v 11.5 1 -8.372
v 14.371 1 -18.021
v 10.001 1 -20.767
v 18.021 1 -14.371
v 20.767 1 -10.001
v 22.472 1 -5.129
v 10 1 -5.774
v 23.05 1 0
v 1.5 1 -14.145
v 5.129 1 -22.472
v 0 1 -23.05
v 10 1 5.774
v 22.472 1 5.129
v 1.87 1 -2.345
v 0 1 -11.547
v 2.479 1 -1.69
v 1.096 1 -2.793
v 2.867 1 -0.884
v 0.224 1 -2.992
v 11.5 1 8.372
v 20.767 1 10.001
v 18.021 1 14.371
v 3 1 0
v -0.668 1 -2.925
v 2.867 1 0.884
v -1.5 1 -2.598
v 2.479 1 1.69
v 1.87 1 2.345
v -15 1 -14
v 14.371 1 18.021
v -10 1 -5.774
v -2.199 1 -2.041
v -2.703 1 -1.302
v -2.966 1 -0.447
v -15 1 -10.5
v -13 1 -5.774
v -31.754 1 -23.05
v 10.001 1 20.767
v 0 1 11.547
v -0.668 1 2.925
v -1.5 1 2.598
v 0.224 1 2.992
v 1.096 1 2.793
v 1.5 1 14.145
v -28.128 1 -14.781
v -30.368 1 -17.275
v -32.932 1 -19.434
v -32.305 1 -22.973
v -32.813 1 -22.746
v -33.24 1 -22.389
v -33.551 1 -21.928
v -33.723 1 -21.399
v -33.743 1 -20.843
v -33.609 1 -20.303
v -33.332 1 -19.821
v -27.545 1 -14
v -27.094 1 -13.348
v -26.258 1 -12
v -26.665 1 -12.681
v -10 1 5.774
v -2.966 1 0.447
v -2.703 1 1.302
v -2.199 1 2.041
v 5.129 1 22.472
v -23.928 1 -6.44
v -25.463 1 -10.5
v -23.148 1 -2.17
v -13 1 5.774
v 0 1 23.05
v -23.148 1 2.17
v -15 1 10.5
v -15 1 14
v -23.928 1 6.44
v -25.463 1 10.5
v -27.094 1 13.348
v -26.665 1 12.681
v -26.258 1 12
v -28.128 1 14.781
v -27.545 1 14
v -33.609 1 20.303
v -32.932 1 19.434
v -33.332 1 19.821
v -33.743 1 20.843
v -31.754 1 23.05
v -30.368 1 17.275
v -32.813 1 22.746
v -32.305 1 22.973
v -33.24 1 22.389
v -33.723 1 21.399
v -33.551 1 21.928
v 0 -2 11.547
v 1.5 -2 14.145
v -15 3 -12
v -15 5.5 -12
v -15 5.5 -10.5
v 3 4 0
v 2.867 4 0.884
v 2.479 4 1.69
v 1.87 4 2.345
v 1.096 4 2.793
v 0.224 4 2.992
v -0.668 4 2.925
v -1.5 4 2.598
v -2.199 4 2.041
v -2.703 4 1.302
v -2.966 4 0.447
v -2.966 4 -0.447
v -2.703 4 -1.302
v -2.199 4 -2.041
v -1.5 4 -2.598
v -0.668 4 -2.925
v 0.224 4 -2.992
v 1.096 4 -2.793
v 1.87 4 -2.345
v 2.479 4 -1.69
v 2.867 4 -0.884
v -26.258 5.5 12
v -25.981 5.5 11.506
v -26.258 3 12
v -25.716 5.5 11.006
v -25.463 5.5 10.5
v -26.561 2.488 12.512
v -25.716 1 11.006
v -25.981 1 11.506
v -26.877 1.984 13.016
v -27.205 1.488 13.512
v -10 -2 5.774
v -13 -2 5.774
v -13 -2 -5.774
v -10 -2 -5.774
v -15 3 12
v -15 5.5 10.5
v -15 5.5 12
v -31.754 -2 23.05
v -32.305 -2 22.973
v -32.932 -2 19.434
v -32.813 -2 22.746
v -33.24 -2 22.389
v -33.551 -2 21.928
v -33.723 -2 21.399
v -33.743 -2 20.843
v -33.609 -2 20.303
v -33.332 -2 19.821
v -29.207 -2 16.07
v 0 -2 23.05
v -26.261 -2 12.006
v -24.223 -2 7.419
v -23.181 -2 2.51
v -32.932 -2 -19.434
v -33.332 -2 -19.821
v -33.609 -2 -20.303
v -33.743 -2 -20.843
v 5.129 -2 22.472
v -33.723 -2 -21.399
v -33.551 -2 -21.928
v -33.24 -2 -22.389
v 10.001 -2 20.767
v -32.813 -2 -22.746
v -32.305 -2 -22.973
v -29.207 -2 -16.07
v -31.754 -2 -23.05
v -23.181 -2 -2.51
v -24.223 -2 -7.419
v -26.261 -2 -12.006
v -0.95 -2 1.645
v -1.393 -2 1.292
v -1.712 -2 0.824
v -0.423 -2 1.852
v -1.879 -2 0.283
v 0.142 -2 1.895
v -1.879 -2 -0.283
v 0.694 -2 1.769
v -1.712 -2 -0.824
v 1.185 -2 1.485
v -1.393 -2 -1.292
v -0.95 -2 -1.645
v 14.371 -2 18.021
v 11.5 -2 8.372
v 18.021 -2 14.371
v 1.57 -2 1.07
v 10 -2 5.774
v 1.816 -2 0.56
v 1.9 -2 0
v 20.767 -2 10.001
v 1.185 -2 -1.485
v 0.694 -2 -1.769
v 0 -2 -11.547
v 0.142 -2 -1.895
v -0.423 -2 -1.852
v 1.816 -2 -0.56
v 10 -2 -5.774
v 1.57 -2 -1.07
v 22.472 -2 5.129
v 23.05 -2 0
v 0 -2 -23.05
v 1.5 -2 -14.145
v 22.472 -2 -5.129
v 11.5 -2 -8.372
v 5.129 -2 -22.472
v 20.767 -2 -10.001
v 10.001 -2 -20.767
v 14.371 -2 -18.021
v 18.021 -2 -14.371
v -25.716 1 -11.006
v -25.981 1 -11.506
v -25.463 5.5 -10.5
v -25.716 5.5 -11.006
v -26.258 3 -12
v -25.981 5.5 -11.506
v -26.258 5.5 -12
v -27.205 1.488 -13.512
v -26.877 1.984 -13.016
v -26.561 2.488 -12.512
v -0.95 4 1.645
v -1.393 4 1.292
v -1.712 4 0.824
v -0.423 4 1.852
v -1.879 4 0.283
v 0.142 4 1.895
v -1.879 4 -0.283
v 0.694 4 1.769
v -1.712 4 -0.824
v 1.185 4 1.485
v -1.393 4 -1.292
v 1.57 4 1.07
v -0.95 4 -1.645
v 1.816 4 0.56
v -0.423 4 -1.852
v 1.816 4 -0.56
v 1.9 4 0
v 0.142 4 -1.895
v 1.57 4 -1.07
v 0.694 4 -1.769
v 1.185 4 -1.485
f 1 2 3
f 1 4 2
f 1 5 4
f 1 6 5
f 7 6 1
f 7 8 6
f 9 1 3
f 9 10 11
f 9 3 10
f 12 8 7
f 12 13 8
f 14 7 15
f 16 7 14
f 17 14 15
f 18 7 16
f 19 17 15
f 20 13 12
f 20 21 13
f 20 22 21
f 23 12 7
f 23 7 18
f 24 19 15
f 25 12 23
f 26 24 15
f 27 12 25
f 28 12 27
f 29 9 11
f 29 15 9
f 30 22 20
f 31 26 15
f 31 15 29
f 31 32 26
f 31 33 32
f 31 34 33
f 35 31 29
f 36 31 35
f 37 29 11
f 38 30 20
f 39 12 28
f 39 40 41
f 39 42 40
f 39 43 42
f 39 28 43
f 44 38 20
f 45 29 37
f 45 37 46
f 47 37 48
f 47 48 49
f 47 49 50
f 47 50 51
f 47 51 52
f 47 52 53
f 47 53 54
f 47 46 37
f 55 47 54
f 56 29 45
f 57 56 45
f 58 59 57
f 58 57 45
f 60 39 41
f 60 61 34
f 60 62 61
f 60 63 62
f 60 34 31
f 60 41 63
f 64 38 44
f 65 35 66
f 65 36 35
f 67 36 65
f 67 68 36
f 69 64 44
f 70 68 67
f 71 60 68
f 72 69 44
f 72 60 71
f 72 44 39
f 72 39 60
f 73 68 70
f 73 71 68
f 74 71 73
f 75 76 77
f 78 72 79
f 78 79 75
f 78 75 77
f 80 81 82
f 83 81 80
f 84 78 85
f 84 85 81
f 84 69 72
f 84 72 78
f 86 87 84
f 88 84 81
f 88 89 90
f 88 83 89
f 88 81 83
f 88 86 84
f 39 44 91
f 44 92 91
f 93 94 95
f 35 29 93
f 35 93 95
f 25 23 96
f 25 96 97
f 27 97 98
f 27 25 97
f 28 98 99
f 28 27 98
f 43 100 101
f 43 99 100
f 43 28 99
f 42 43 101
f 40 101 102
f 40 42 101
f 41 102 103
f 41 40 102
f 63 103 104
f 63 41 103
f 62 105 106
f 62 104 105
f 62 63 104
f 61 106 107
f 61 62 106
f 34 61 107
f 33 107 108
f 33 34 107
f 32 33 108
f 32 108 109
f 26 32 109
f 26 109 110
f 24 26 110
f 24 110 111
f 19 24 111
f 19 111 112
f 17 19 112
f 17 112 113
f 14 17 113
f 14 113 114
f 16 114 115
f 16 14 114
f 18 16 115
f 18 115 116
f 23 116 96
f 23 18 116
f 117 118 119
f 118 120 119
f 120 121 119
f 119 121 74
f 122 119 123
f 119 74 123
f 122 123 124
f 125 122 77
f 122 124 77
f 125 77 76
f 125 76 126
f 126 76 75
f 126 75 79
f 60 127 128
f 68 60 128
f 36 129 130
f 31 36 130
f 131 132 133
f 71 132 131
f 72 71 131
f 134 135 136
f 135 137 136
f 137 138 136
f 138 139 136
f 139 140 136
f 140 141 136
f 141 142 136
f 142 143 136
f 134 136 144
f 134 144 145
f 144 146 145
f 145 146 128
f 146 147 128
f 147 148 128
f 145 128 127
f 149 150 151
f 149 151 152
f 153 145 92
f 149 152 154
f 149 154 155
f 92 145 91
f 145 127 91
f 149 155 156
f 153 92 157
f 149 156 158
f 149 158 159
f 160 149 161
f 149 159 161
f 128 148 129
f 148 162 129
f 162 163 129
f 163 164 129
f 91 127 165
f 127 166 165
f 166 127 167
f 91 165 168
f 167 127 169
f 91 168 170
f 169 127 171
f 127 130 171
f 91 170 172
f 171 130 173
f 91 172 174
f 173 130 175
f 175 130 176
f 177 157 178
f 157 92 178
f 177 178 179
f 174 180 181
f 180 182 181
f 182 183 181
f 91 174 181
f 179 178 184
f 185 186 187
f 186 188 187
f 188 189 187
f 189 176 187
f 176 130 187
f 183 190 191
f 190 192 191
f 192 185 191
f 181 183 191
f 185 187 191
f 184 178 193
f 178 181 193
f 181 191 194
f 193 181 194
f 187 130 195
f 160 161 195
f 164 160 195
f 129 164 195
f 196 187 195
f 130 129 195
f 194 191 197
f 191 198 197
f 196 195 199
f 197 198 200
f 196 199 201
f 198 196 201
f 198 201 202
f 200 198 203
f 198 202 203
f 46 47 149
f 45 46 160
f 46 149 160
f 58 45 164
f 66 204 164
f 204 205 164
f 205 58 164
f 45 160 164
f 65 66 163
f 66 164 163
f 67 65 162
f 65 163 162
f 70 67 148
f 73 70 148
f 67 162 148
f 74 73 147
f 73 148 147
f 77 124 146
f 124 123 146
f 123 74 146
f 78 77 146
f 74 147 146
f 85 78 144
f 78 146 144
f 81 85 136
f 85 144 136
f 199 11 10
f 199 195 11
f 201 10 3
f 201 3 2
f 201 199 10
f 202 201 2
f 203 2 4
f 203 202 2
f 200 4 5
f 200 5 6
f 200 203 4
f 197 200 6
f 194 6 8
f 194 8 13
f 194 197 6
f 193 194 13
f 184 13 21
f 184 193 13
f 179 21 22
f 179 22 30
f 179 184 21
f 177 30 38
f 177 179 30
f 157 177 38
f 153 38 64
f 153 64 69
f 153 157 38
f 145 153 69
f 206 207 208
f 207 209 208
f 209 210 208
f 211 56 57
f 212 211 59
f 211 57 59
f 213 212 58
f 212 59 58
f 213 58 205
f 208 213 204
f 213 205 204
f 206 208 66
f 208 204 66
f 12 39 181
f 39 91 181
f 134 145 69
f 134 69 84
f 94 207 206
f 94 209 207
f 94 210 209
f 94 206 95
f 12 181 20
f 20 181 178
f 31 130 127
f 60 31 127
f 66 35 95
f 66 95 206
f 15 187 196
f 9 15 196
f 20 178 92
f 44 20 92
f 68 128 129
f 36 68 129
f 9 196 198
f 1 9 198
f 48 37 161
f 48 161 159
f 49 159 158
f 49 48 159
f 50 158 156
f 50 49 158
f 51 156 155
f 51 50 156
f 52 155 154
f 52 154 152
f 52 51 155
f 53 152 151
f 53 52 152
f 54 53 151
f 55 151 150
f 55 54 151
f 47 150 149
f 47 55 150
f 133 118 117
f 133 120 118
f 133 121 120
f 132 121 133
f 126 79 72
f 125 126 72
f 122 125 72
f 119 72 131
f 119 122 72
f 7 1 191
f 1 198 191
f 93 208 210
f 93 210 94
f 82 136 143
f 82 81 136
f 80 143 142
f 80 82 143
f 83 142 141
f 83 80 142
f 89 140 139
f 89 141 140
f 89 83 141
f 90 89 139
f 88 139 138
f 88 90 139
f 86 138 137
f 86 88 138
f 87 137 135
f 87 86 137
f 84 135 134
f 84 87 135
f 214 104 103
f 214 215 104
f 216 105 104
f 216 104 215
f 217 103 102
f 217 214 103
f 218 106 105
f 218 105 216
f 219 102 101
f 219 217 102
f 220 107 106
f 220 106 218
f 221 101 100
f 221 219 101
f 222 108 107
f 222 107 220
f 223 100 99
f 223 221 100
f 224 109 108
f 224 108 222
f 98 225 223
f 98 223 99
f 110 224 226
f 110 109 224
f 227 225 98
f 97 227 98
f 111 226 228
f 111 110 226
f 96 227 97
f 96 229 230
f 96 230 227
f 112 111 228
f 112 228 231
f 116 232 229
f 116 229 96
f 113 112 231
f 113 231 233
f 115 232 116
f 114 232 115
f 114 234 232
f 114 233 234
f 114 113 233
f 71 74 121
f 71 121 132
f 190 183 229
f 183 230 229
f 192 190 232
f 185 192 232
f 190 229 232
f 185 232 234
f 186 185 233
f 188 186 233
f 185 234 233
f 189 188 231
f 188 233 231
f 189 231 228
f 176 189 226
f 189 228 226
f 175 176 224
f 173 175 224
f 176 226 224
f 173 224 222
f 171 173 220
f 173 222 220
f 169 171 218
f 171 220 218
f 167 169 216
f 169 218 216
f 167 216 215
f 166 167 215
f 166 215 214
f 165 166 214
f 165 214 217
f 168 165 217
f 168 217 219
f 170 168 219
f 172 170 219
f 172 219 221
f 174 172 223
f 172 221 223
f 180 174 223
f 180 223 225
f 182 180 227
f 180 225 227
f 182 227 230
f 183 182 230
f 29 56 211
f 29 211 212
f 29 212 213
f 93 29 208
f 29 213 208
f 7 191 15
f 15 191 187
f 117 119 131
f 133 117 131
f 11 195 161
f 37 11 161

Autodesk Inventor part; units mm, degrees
ref_plane "YZ Plane" through (0, 0, 0) normal (1, 0, 0) x (0, 1, 0)
ref_plane "XZ Plane" through (0, 0, 0) normal (0, 1, 0) x (-1, 0, 0)
ref_plane "XY Plane" through (0, 0, 0) normal (0, 0, 1) x (1, 0, 0)
sketch "スケッチ1" plane through (0, 0, 0) normal (0, 1, 0) x (-1, 0, 0)
  circle A0 centre (0, 0) radius 6
  dimension "d0" = 12
extrude "押し出し1" add sketch "スケッチ1" along normal blind 1
sketch "スケッチ2" plane through (0, 1, 0) normal (0, 1, 0) x (1, 0, 0)
  circle A0 centre (0, 0) radius 3
  dimension "d3" = 6
extrude "押し出し2" add sketch "スケッチ2" along normal blind 3
sketch "スケッチ3" plane through (0, 4, 0) normal (0, 1, 0) x (1, 0, 0)
  circle A0 centre (0, 0) radius 1.9
  dimension "d6" = 3.8
extrude "押し出し3" cut sketch "スケッチ3" against normal through all
sketch "スケッチ4" plane through (0, 1, 0) normal (0, 1, 0) x (1, 0, 0)
  circle A0 centre (0, 0) radius 23.55
  circle A1 centre (-47.1, 0) radius 23.55
  line L0 (-47.1, 23.55) -> (0, 23.55)
  line L1 (0, -23.55) -> (-47.1, -23.55)
  circle A2 centre (0, 0) radius 1.9 projected
  dimension "d11" = 47.1
extrude "押し出し4" add sketch "スケッチ4" against normal blind 3 contours A0 | A0 A1 L0 | L1 A1 A0
sketch "スケッチ5" plane through (0, -2, 0) normal (0, -1, 0) x (1, 0, 0)
  circle A0 centre (0, 0) radius 23.05
  circle A1 centre (-47.1, 0) radius 24.05
  arc A2 (0, -23.55) -> (0, 23.55) centre (0, 0) ccw projected
  arc A3 (-47.1, -23.55) -> (-47.1, 23.55) centre (-47.1, 0) ccw projected
  line L0 (0, 23.05) -> (-40.2371, 23.05)
  line L1 (0, -23.05) -> (-40.2371, -23.05)
  line L2 (30, 40) -> (-80, 40)
  line L3 (-80, 40) -> (-80, -50)
  line L4 (-80, -50) -> (30, -50)
  line L5 (30, -50) -> (30, 40)
  dimension "d14" = 0.5
  dimension "d15" = 0.5
extrude "押し出し5" cut sketch "スケッチ5" against normal through all contours A1 | L5 L4 L3 L2
fillet "フィレット1" radius 2 2 edges at (-40.2371, -0.5, 23.05) (-40.2371, -0.5, -23.05)
sketch "スケッチ6" plane through (0, -2, 0) normal (0, -1, 0) x (1, 0, 0)
  circle A0 centre (0, 0) radius 10
  line L0 (10, 5.7735) -> (10, -5.7735)
  line L1 (10, -5.7735) -> (0, -11.547)
  line L2 (0, -11.547) -> (-10, -5.7735)
  line L3 (-10, -5.7735) -> (-10, 5.7735)
  line L4 (-10, 5.7735) -> (0, 11.547)
  line L5 (0, 11.547) -> (10, 5.7735)
  line L6 (-10, -5.7735) -> (-10, 5.7735)
  line L7 (-10, 5.7735) -> (-13, 5.7735)
  line L8 (-13, 5.7735) -> (-13, -5.7735)
  line L9 (-13, -5.7735) -> (-10, -5.7735)
  line L10 (0, 11.547) -> (10, 5.7735)
  line L11 (10, 5.7735) -> (11.5, 8.3716)
  line L12 (11.5, 8.3716) -> (1.5, 14.1451)
  line L13 (1.5, 14.1451) -> (0, 11.547)
  line L14 (10, -5.7735) -> (0, -11.547)
  line L15 (0, -11.547) -> (1.5, -14.1451)
  line L16 (1.5, -14.1451) -> (11.5, -8.3716)
  line L17 (11.5, -8.3716) -> (10, -5.7735)
  point P0 (10, -5.7735)
  dimension "d19" = 20
  dimension "d20" = 3
  dimension "d21" = 3
  dimension "d22" = 3
extrude "押し出し6" cut sketch "スケッチ6" against normal through all contours L5 L13 L12 L11 | L1 L17 L16 L15 | L3 L9 L8 L7
sketch "スケッチ7" plane through (0, 1, 0) normal (0, 1, 0) x (1, 0, 0)
  line L0 (0, 10.5) -> (-45, 10.5)
  line L1 (-45, 10.5) -> (-45, -10.5)
  line L2 (-45, -10.5) -> (0, -10.5)
  line L3 (0, -10.5) -> (0, 10.5)
  line L4 (-15, 10.5) -> (-45, 10.5)
  line L5 (-45, 10.5) -> (-45, 12)
  line L6 (-45, 12) -> (-15, 12)
  line L7 (-15, 12) -> (-15, 10.5)
  line L8 (-15, -10.5) -> (-45, -10.5)
  line L9 (-45, -10.5) -> (-45, -12)
  line L10 (-45, -12) -> (-15, -12)
  line L11 (-15, -12) -> (-15, -10.5)
  arc A0 (-32.9322, -19.4339) -> (-32.9322, 19.4339) centre (-47.1, 0) ccw projected
  point P0 (0, 0)
  point P1 (0, 0)
  point P2 (-25.4632, -10.5)
  point P3 (-26.2577, -12)
  point P4 (-26.2577, 12)
  point P5 (-25.4632, 10.5)
  dimension "d25" = 21
  dimension "d26" = 15
  dimension "d27" = 1.5
  dimension "d28" = 1.5
extrude "押し出し7" add sketch "スケッチ7" along normal blind 4.5 contours L0 A0 L6 L7 | L11 L10 A0 L2
chamfer "面取り1" distance 2 angle 45 2 edges at (-20.6288, 1, 12) (-20.6288, 1, -12)
properties part number "ベルト_bush_upper"
